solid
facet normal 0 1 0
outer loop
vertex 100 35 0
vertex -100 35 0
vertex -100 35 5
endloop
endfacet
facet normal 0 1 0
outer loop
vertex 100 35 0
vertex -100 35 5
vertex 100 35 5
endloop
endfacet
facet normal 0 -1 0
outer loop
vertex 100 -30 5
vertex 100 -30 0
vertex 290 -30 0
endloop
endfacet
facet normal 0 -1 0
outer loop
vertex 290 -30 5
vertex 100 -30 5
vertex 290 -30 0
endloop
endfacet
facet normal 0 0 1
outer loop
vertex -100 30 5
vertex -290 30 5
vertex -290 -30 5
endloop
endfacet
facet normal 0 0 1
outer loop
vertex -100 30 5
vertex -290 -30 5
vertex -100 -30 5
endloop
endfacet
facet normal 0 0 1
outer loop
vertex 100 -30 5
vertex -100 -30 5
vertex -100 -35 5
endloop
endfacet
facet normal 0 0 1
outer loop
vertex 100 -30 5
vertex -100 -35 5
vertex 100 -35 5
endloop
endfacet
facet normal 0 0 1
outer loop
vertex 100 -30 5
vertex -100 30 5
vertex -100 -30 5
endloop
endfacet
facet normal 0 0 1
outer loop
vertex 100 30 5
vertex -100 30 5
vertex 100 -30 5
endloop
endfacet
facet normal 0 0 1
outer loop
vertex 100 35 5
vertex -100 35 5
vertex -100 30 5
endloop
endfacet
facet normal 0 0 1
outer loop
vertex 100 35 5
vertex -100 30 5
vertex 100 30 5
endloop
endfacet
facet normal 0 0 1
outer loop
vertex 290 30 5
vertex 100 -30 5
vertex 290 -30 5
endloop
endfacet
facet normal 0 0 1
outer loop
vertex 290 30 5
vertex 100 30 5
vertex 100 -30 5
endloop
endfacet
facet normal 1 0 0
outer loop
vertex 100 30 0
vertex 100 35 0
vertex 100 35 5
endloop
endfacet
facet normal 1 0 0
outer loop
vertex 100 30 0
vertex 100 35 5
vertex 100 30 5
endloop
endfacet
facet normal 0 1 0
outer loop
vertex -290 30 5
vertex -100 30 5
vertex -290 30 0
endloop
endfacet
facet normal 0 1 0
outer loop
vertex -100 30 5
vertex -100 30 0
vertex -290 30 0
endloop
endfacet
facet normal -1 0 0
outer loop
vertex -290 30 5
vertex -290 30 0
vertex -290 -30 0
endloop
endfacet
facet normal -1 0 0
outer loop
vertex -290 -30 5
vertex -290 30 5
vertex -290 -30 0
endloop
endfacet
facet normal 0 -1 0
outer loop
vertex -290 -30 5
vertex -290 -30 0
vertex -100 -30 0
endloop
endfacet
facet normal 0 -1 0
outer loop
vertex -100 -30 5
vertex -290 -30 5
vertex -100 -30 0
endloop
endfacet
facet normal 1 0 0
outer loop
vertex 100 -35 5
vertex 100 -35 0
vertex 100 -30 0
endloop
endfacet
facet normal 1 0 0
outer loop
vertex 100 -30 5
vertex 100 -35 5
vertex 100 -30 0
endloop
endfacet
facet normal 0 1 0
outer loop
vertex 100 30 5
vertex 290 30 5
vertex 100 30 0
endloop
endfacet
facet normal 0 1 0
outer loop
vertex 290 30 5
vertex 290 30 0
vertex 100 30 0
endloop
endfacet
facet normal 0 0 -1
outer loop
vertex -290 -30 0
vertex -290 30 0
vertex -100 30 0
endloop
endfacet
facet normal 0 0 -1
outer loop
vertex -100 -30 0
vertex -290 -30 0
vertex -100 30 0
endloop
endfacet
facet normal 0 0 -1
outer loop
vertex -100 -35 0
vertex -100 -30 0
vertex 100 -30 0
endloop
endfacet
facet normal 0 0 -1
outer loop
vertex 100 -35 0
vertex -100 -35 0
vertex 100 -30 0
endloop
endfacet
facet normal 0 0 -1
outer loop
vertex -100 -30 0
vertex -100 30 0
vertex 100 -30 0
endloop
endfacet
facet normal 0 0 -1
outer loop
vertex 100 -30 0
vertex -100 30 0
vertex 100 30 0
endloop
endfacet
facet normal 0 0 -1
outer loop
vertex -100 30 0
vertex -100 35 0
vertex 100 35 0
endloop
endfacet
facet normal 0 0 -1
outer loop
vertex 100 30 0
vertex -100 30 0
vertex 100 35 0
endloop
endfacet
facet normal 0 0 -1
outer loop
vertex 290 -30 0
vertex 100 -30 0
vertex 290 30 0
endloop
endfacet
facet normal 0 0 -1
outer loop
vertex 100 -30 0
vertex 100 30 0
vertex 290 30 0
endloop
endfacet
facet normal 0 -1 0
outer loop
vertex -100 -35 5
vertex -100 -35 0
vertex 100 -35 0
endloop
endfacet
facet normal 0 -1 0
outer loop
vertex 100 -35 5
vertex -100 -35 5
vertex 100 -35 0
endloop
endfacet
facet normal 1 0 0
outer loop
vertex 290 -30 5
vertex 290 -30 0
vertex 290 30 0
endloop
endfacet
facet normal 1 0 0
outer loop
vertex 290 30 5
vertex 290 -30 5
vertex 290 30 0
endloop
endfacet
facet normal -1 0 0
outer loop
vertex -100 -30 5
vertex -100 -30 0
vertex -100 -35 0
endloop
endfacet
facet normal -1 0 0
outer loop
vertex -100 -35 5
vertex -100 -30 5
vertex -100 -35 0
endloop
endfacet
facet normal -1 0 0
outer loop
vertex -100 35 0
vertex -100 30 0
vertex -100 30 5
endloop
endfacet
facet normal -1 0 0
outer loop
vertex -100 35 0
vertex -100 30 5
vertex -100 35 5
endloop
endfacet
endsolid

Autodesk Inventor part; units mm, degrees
ref_plane "YZ Plane" through (0, 0, 0) normal (1, 0, 0) x (0, 1, 0)
ref_plane "XZ Plane" through (0, 0, 0) normal (0, 1, 0) x (-1, 0, 0)
ref_plane "XY Plane" through (0, 0, 0) normal (0, 0, 1) x (1, 0, 0)
sketch "Sketch1" plane through (0, 0, 0) normal (0, 0, 1) x (1, 0, 0)
  line L0 (-290, -30) -> (290, -30)
  line L1 (290, -30) -> (290, 30)
  line L2 (290, 30) -> (-290, 30)
  line L3 (-290, 30) -> (-290, -30)
  line L4 (-290, -30) -> (290, 30) construction
  line L5 (290, -30) -> (-290, 30) construction
  line L6 (-100, 35) -> (100, 35)
  line L7 (100, 35) -> (100, 30)
  line L8 (100, 30) -> (-100, 30)
  line L9 (-100, 30) -> (-100, 35)
  line L10 (-100, 35) -> (100, 30) construction
  line L11 (100, 35) -> (-100, 30) construction
  line L12 (-290, 0) -> (290, 0)
  line L13 (-100, -35) -> (100, -35)
  line L14 (100, -35) -> (100, -30)
  line L15 (100, -30) -> (-100, -30)
  line L16 (-100, -30) -> (-100, -35)
  line L17 (-100, -35) -> (100, -30) construction
  line L18 (100, -35) -> (-100, -30) construction
  point P0 (0, 0)
  point P1 (0, 32.5)
  point P2 (0, 30)
  point P3 (0, -32.5)
  point P4 (0, -30)
  point P5 (-100, 30)
  point P6 (-100, -30)
  dimension "d0" = 580
  dimension "d1" = 60
  dimension "d2" = 5
  dimension "d3" = 200
extrude "Plate1" add sketch "Sketch1" along normal blind 5
equation "\"d4\" = Thickness"
equation "\"BendRadius\" = Thickness"
equation "\"BendReliefWidth\" = Thickness"
equation "\"BendReliefDepth\" = 0.5 * Thickness"
equation "\"TransitionRadius\" = BendRadius"
equation "\"JacobiRadiusSize\" = BendRadius"
equation "\"GapSize\" = Thickness"
equation "\"Thickness\" = 5"
properties part number "Table-Base Fixation"
